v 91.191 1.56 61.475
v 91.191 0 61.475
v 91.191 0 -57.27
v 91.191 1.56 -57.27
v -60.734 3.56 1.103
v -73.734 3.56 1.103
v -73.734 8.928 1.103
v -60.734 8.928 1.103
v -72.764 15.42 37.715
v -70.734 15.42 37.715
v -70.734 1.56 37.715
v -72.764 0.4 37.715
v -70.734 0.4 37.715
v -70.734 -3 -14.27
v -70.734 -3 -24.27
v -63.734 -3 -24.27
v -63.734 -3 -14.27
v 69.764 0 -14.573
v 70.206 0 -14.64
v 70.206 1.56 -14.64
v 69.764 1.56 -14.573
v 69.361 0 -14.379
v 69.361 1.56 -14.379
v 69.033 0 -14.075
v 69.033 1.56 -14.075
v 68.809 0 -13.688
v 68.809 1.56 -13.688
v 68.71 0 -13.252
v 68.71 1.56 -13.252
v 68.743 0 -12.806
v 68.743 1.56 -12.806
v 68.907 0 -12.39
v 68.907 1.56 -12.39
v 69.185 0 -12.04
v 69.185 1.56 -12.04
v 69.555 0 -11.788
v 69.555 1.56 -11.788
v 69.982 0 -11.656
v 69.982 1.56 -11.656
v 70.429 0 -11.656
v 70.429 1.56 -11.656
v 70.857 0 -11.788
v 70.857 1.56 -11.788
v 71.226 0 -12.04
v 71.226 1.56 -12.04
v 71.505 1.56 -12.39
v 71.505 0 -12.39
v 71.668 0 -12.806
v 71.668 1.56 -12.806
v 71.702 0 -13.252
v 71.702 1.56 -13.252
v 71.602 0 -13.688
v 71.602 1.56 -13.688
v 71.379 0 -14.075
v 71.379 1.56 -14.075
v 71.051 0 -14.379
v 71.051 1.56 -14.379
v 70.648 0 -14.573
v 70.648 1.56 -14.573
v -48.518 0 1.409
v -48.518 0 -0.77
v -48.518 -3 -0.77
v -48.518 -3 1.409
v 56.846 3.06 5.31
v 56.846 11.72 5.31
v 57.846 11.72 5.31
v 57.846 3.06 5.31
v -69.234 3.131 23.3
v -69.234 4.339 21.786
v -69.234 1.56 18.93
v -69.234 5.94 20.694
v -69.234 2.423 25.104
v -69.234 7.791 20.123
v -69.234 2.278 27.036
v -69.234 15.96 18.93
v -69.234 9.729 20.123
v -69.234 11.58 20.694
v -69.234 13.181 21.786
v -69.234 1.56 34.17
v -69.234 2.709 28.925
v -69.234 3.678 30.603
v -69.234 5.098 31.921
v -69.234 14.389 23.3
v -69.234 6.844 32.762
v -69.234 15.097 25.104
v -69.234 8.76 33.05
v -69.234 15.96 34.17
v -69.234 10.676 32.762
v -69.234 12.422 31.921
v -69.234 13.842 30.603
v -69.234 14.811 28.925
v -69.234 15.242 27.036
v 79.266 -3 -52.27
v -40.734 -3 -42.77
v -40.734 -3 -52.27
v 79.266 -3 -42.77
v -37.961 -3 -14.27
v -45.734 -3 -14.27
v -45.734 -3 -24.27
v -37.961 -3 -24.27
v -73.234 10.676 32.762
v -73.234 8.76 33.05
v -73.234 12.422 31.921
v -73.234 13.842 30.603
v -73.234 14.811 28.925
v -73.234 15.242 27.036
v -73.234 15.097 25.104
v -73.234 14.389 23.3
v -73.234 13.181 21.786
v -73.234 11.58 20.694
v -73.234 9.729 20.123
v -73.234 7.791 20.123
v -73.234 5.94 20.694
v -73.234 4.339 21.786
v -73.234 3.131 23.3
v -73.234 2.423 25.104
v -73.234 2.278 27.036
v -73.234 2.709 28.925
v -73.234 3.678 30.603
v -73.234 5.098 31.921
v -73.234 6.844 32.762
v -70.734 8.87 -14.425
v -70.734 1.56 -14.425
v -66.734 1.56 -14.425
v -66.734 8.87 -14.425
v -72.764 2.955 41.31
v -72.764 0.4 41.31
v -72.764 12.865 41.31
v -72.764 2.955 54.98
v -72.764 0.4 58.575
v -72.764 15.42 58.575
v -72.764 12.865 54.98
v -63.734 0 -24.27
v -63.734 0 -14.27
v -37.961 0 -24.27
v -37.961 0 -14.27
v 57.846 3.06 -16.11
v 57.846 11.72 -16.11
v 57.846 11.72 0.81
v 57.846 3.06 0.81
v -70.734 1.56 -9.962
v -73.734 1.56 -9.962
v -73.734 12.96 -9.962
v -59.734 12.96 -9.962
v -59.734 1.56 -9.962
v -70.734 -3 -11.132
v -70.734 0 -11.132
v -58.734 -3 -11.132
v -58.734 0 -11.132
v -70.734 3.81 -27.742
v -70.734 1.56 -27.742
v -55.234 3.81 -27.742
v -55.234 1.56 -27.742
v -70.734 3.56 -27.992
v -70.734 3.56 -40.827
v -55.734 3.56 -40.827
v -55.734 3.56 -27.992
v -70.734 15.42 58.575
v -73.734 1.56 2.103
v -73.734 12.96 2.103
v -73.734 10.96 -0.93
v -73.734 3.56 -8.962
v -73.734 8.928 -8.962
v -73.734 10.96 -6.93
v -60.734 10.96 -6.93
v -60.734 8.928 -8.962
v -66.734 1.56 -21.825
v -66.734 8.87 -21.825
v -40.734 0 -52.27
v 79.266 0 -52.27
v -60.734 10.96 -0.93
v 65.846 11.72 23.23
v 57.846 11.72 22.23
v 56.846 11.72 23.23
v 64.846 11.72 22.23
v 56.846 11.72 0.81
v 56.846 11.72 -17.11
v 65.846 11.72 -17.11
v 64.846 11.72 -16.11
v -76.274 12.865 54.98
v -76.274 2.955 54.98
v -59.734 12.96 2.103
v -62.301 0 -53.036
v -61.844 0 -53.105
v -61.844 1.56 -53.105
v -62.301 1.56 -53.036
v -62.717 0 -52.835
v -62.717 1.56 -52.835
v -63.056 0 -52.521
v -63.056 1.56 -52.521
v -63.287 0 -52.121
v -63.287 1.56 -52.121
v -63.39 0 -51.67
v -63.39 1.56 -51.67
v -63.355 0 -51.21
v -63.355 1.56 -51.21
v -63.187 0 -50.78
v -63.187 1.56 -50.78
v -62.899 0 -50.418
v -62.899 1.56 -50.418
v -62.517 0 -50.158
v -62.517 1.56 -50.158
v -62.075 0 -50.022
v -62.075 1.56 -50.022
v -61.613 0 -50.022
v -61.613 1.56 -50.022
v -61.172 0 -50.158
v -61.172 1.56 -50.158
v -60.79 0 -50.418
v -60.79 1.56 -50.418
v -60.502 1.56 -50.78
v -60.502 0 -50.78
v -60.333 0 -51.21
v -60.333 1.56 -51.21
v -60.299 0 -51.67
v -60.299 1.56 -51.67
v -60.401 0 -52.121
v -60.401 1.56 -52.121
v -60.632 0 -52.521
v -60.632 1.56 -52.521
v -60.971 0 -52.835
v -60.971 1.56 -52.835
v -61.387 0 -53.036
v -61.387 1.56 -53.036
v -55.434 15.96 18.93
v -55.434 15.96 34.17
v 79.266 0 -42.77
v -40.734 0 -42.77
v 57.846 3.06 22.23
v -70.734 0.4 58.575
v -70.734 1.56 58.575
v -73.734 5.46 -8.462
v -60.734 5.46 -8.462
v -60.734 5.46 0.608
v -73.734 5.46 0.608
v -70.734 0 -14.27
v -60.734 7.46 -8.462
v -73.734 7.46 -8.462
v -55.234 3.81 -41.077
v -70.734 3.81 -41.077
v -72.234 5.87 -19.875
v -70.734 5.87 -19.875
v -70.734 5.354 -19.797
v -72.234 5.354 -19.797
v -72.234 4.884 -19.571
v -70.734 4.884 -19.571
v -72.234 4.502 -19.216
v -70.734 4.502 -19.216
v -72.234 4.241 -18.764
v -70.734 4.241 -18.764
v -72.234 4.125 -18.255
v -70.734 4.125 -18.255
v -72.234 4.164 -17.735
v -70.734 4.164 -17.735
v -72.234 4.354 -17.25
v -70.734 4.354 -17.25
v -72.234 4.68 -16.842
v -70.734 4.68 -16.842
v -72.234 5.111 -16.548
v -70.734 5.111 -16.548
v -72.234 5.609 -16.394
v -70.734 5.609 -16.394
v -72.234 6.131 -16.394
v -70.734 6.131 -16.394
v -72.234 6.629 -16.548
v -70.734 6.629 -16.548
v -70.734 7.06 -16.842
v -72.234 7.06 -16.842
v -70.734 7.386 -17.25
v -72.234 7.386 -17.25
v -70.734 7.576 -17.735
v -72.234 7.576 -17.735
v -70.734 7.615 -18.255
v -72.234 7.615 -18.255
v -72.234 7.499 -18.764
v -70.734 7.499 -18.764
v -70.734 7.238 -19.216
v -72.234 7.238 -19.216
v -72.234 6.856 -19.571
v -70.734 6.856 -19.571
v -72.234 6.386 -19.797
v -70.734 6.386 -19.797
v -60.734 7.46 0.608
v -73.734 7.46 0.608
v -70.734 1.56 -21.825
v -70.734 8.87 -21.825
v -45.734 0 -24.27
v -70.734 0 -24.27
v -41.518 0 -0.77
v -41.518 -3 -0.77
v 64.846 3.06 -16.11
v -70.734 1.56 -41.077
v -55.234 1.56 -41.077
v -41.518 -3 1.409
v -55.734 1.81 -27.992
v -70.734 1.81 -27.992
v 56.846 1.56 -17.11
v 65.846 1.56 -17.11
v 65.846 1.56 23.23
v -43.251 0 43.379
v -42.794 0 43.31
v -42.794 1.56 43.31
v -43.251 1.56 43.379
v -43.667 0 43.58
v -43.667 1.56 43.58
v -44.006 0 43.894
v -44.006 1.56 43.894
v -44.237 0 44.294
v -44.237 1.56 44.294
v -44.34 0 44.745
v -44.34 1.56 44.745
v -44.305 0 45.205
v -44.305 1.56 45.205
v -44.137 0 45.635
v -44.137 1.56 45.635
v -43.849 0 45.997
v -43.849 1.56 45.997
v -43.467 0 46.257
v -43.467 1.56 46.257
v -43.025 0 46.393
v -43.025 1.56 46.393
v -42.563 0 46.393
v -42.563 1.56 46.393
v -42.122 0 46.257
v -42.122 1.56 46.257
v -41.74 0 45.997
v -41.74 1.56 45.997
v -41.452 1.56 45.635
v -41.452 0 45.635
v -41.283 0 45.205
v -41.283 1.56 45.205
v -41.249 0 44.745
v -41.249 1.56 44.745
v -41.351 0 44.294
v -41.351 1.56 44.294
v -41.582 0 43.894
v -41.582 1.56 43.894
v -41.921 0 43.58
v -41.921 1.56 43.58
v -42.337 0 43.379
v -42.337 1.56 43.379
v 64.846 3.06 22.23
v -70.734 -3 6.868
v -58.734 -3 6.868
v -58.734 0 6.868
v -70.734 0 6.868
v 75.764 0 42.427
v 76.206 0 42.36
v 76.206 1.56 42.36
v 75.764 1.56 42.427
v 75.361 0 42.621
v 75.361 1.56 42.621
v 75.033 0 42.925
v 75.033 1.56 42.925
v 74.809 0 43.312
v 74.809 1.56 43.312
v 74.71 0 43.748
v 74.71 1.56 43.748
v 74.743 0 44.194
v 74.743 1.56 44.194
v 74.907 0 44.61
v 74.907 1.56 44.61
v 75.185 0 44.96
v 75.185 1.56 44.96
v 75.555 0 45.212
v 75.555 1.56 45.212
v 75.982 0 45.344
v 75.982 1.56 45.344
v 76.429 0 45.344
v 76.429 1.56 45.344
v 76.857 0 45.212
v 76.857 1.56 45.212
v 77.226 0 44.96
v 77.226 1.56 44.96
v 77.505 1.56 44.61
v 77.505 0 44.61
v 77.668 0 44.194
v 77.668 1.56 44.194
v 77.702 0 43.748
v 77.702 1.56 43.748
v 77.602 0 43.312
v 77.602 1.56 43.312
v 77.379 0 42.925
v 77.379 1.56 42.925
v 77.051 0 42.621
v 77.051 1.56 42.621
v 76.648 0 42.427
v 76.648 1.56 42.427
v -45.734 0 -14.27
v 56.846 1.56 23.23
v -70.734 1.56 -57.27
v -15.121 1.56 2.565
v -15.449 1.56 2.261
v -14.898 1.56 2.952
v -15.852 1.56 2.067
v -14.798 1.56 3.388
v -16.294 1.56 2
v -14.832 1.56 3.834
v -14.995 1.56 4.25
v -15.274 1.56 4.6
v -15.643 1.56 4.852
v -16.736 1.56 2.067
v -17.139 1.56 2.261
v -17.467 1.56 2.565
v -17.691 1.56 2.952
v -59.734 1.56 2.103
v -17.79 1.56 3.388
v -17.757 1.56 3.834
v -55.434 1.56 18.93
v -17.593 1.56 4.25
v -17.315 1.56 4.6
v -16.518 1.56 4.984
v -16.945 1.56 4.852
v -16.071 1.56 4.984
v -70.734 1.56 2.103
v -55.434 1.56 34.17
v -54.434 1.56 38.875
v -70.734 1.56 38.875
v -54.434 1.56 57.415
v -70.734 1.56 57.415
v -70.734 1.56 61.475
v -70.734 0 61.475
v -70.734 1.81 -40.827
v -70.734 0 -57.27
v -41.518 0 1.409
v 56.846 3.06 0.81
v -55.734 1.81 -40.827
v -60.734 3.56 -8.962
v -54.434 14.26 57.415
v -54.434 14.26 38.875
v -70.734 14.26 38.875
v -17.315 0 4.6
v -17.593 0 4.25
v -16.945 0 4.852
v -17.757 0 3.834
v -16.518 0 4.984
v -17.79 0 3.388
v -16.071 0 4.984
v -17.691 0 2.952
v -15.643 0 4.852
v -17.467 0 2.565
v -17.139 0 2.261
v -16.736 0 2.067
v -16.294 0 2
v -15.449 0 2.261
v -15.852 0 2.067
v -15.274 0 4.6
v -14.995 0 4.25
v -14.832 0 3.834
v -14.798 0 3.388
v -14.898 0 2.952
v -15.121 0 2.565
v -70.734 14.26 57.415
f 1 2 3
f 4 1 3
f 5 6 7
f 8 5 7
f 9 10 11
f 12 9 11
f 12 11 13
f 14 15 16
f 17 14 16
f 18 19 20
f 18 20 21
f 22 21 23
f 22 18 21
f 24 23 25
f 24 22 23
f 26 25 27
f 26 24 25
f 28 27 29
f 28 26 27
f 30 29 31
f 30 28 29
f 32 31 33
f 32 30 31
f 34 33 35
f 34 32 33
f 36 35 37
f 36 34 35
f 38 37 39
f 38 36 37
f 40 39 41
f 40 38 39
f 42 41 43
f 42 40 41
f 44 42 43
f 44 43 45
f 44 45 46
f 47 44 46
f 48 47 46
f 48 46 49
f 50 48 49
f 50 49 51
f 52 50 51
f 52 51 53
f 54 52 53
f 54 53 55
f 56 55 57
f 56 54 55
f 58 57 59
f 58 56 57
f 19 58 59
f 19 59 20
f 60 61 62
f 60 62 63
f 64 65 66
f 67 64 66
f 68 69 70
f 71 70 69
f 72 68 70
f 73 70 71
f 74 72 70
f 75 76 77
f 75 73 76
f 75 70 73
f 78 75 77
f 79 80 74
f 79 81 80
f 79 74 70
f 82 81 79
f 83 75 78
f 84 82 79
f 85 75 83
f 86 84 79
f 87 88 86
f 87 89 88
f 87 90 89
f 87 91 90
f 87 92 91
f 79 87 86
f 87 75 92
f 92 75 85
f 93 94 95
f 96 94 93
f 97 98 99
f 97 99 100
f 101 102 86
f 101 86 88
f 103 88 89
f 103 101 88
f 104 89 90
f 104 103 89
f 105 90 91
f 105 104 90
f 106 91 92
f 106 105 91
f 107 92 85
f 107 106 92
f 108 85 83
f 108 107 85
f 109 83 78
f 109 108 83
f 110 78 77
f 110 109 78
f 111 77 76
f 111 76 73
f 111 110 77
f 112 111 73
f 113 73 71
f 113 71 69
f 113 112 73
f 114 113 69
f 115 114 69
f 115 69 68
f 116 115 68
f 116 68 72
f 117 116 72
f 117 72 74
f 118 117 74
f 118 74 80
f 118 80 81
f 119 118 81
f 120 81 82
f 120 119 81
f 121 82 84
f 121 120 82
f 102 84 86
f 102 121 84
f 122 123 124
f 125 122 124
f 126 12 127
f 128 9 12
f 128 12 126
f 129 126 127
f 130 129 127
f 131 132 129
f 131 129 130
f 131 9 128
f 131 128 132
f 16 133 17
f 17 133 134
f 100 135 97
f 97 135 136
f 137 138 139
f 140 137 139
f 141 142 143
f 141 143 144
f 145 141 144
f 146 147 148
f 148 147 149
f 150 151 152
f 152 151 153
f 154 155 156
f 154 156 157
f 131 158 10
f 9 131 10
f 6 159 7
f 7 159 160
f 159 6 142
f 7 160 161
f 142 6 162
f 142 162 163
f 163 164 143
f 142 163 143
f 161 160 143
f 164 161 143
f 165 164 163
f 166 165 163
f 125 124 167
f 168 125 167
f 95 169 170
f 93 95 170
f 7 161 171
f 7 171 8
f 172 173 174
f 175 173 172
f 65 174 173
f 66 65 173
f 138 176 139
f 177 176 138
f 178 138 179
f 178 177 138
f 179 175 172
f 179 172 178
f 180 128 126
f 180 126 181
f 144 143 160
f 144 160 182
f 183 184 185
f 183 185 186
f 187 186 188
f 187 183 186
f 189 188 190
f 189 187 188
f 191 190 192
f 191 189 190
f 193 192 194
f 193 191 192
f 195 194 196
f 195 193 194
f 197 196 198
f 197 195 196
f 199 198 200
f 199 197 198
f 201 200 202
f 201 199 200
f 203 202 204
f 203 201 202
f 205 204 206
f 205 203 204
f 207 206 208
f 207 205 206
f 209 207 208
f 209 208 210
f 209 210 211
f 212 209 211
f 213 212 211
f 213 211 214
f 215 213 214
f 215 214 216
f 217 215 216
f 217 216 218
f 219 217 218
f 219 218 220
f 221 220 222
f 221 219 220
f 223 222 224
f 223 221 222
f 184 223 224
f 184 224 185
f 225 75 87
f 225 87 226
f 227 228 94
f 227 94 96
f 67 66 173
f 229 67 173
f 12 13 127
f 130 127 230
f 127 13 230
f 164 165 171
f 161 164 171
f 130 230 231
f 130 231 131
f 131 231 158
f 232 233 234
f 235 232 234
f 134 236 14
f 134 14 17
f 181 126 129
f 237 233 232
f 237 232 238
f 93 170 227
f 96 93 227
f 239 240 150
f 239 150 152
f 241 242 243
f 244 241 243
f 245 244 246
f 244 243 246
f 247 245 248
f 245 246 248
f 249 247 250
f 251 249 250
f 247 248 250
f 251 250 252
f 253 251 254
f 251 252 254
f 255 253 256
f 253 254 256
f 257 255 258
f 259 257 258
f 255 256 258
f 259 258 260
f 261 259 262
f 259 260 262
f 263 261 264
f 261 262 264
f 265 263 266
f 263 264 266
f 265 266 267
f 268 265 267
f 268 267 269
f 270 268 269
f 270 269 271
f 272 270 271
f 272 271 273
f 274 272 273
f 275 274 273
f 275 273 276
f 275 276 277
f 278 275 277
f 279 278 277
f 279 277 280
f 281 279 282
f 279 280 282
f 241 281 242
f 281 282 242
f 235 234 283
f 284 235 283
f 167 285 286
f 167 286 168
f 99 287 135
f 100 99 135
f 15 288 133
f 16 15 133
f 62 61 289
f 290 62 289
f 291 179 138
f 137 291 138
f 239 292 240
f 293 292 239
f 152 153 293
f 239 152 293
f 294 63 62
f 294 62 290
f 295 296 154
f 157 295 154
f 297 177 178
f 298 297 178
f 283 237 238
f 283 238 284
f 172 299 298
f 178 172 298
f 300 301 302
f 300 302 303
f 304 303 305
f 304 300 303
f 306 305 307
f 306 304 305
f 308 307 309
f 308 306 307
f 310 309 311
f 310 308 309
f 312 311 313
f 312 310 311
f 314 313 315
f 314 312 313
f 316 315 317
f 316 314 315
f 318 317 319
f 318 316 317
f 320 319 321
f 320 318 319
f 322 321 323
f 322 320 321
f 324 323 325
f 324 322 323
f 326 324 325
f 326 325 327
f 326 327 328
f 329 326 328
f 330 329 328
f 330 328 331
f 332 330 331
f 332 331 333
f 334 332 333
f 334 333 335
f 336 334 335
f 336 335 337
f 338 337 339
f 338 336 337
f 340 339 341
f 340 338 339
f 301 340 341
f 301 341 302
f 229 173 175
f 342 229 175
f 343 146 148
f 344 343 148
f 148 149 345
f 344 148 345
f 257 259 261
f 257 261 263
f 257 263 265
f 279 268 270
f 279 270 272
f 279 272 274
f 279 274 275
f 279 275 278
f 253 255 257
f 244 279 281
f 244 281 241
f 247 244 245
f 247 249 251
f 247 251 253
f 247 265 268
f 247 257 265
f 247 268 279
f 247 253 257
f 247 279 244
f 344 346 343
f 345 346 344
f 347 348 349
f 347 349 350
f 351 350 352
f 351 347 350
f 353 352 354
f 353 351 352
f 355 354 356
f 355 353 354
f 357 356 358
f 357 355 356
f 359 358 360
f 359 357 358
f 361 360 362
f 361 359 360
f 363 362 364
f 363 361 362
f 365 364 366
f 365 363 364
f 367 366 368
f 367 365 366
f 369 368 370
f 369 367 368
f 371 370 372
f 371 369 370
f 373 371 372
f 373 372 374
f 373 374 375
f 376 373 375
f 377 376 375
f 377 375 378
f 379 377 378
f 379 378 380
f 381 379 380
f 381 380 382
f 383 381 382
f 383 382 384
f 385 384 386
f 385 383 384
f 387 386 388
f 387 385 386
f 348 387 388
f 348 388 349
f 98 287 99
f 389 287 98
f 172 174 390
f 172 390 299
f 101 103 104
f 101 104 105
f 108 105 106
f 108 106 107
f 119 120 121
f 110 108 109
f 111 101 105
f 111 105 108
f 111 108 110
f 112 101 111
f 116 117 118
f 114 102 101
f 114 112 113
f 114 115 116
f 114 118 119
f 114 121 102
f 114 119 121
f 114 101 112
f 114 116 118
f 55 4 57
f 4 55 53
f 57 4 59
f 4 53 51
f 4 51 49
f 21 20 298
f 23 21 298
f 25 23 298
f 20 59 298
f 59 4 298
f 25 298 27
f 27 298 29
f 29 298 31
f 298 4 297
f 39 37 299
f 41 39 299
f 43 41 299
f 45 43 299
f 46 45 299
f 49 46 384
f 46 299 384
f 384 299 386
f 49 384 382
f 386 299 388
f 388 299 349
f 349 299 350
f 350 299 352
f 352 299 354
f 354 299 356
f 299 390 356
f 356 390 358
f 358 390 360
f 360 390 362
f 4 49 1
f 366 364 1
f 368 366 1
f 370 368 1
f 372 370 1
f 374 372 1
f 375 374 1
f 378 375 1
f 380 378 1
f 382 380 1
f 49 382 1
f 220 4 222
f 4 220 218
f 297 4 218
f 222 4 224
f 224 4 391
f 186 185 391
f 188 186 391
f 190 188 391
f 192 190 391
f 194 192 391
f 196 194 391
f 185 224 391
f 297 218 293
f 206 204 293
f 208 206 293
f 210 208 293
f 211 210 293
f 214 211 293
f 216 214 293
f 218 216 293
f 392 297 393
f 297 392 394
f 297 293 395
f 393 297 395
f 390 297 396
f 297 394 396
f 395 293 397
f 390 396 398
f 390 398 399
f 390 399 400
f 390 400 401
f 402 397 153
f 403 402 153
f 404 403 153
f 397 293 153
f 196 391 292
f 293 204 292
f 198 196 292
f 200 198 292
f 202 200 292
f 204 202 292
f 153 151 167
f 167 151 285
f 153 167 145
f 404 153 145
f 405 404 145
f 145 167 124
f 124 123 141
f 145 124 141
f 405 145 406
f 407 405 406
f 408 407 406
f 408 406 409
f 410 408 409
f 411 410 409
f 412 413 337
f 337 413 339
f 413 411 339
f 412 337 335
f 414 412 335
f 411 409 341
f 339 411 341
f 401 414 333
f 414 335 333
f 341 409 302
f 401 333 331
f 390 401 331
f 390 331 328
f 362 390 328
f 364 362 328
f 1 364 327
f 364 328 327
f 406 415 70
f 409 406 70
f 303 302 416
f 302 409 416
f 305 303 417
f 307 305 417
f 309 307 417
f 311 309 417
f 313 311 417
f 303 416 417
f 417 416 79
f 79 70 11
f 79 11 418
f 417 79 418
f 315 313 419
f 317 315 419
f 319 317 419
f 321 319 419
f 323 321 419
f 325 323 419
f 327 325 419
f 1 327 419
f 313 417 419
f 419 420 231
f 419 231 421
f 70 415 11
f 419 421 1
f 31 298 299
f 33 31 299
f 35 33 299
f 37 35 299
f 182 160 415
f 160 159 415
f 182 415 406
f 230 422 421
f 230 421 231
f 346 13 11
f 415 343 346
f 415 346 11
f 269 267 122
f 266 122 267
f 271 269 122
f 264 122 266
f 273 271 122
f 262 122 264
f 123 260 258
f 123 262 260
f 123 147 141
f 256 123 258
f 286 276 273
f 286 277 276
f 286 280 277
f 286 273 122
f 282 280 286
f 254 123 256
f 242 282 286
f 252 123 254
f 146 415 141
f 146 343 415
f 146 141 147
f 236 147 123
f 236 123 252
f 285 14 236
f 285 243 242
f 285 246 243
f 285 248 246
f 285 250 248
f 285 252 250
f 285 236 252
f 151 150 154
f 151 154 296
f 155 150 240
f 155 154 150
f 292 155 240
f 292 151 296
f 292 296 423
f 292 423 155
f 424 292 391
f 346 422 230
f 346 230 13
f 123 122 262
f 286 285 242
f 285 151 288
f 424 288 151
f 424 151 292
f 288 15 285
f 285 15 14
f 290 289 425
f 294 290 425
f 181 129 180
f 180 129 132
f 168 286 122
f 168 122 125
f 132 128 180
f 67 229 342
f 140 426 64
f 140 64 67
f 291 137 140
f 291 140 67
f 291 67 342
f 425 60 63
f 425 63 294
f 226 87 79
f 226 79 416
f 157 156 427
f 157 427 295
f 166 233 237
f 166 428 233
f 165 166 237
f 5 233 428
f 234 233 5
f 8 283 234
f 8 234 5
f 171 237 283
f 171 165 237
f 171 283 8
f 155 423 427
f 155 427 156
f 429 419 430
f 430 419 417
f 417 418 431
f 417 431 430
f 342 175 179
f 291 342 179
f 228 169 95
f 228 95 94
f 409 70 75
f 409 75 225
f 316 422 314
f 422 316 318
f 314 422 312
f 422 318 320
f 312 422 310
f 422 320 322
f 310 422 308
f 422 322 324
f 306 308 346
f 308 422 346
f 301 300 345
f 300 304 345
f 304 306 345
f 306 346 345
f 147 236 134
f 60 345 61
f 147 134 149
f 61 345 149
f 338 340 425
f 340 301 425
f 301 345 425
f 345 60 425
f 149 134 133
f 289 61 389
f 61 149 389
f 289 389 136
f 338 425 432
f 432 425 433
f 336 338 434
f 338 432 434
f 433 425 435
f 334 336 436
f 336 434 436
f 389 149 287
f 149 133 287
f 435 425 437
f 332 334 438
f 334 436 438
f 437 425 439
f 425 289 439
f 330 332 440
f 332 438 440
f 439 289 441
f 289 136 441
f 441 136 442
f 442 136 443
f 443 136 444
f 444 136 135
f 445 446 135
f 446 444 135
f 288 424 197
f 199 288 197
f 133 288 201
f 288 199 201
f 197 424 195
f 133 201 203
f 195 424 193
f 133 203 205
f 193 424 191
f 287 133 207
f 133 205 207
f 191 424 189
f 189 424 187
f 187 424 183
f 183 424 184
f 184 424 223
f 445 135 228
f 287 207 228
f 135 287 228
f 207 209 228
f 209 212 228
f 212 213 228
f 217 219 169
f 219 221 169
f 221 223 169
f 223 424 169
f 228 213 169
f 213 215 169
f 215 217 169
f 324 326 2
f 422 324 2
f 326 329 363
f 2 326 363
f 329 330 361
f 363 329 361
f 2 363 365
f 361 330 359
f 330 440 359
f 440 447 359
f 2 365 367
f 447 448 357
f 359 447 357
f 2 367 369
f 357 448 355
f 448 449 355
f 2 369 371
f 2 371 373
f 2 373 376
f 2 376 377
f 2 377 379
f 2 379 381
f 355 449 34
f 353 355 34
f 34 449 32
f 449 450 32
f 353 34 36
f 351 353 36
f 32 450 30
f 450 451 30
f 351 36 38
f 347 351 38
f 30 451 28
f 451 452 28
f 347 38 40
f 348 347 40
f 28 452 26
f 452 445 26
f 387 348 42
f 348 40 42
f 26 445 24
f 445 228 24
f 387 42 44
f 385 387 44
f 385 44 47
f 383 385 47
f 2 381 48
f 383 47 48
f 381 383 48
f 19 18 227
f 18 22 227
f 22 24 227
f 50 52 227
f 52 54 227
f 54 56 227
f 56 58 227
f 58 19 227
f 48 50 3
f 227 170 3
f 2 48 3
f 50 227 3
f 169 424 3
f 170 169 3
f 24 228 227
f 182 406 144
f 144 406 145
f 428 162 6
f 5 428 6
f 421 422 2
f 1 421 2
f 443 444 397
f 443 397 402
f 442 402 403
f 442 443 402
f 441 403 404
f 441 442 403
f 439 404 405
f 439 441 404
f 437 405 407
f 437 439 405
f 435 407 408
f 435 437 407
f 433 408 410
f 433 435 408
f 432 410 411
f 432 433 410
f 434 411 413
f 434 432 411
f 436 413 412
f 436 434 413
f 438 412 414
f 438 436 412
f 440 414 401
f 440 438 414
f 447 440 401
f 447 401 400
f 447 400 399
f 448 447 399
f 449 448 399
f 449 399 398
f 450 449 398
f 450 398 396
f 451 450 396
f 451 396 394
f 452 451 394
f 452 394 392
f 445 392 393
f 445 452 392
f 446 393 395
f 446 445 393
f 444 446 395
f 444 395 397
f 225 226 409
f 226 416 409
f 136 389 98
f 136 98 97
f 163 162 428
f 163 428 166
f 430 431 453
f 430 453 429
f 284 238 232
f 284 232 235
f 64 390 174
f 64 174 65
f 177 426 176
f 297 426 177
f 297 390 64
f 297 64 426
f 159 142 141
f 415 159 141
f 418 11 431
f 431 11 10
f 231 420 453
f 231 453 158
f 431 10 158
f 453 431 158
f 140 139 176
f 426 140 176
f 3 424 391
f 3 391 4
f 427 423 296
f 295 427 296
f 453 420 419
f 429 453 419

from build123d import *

# Parameters (mm, degrees)
SKETCH1_W            = 161.925
SKETCH1_H            = 118.745
SKETCH1_R            = 1.55
SKETCH1_R_2          = 1.5
BOSS_EXTRUDE1_DEPTH  = 1.56
SKETCH2_W            = 20
SKETCH2_H            = 10.4775
SKETCH2_W_2          = 15.3
SKETCH2_H_2          = 7.62
SKETCH2_W_3          = 11
SKETCH2_H_3          = 6.0325
SKETCH2_W_4          = 15.5
SKETCH2_H_4          = 6.6675
BOSS_EXTRUDE2_DEPTH  = 5
SKETCH4_W            = 17.8
SKETCH4_H            = 15.24
BOSS_EXTRUDE3_DEPTH  = 9.4
SKETCH5_W            = 15.24
SKETCH5_H            = 14.4
SKETCH5_R            = 6.5
CUT_EXTRUDE1_DEPTH   = 4
SKETCH7_W            = 15.5
SKETCH7_H            = 13.335
CUT_EXTRUDE3_DEPTH   = 2.75
SKETCH8_W            = 12.835
SKETCH8_H            = 1.75
CUT_EXTRUDE4_DEPTH   = 15
SKETCH9_W            = 14
SKETCH9_H            = 12.065
BOSS_EXTRUDE4_DEPTH  = 6.4
SKETCH10_W           = 10.065
SKETCH10_H           = 7.4
CUT_EXTRUDE5_DEPTH   = 13
SKETCH11_W           = 9.07
SKETCH11_H           = 2
BOSS_EXTRUDE5_DEPTH  = 13
BOSS_EXTRUDE6_DEPTH  = 5
BOSS_EXTRUDE8_DEPTH  = 4
SKETCH38_W           = 31.093633867
SKETCH38_H           = 25.604360888
CUT_EXTRUDE14_DEPTH  = 10
SKETCH39_W           = 16.3
SKETCH39_H           = 18.54
BOSS_EXTRUDE9_DEPTH  = 12.7
SKETCH40_W           = 1.16
SKETCH40_H           = 1.16
SKETCH40_H_2         = 12.7
BOSS_EXTRUDE10_DEPTH = 2.03
SKETCH41_W           = 13.67
SKETCH41_H           = 9.91
BOSS_EXTRUDE11_DEPTH = 3.51
CUT_EXTRUDE15_DEPTH  = 111.727077745
SKETCH43_W           = 9
SKETCH43_H           = 40.34
BOSS_EXTRUDE12_DEPTH = 10.16
CUT_EXTRUDE16_DEPTH  = 8.66
SKETCH46_W           = 120
SKETCH46_H           = 9.5
SKETCH46_W_2         = 7
SKETCH46_H_2         = 10
SKETCH46_W_3         = 7.773635701
SKETCH46_W_4         = 12
SKETCH46_H_3         = 18
SKETCH46_H_4         = 2.178592617
BOSS_EXTRUDE14_DEPTH = 3
BOSS_EXTRUDE15_DEPTH = 13
SKETCH49_W           = 4
SKETCH49_H           = 7.4
BOSS_EXTRUDE16_DEPTH = 7.31
SKETCH50_R           = 1.75
BOSS_EXTRUDE17_DEPTH = 1.5


with BuildPart() as part:
    # Sketch1 → Boss-Extrude1 (new body)
    with BuildSketch(Plane(origin=(0, 0, 0), x_dir=(1, 0, 0), z_dir=(0, 1, 0))):
        with Locations((10.228253106, -2.102894012)):
            Rectangle(SKETCH1_W, SKETCH1_H)
        with Locations(Location((-42.794246894, -44.860394012, 0), (0, 0, 90))):
            Circle(SKETCH1_R, mode=Mode.SUBTRACT)
        with Locations(Location((-61.844246894, 51.554605988, 0), (0, 0, 90))):
            Circle(SKETCH1_R, mode=Mode.SUBTRACT)
        with Locations(Location((70.205753106, 13.139605988, 0), (0, 0, 90))):
            Circle(SKETCH1_R_2, mode=Mode.SUBTRACT)
        with Locations(Location((-16.294246894, -3.500394012, 0), (0, 0, 90))):
            Circle(SKETCH1_R_2, mode=Mode.SUBTRACT)
        with Locations(Location((76.205753106, -43.860394012, 0), (0, 0, 90))):
            Circle(SKETCH1_R_2, mode=Mode.SUBTRACT)
    extrude(amount=BOSS_EXTRUDE1_DEPTH)

    # Sketch2 → Boss-Extrude2 (add)
    with BuildSketch(Plane(origin=(0, 1.56, 0), x_dir=(1, 0, 0), z_dir=(0, 1, 0))):
        with Locations((-60.734246894, -42.901644012)):
            Rectangle(SKETCH2_W, SKETCH2_H)
        with Locations((-60.734246894, -53.379144012)):
            Rectangle(SKETCH2_W, SKETCH2_H)
        with Locations((-63.084246894, -30.360394012)):
            Rectangle(SKETCH2_W_2, SKETCH2_H_2)
        with Locations((-63.084246894, -22.740394012)):
            Rectangle(SKETCH2_W_2, SKETCH2_H_2)
        Polygon((-70.734246894, -34.170394012), (-70.734246894, -26.550394012), (-70.734246894, -18.930394012), (-73.234246894, -18.930394012), (-73.234246894, -34.170394012), align=None)
        with Locations((-65.234246894, 6.945855988)):
            Rectangle(SKETCH2_W_3, SKETCH2_H_3)
        Polygon((-70.734246894, -2.102894012), (-70.734246894, 3.929605988), (-70.734246894, 9.962105988), (-73.734246894, 9.962105988), (-73.734246894, -2.102894012), align=None)
        with Locations((-65.234246894, 0.913355988)):
            Rectangle(SKETCH2_W_3, SKETCH2_H_3)
        with Locations((-62.984246894, 37.743355988)):
            Rectangle(SKETCH2_W_4, SKETCH2_H_4)
        with Locations((-62.984246894, 31.075855988)):
            Rectangle(SKETCH2_W_4, SKETCH2_H_4)
    extrude(amount=BOSS_EXTRUDE2_DEPTH)

    # Sketch4 → Boss-Extrude3 (add)
    with BuildSketch(Plane(origin=(0, 6.56, 0), x_dir=(1, 0, 0), z_dir=(0, 1, 0))):
        with Locations((-64.334246894, -26.550394012)):
            Rectangle(SKETCH4_W, SKETCH4_H)
    extrude(amount=BOSS_EXTRUDE3_DEPTH)

    # Sketch5 → Cut-Extrude1 (cut)
    with BuildSketch(Plane.ZY.offset(73.234246894)):
        with Locations((26.550394012, 8.76)):
            Rectangle(SKETCH5_W, SKETCH5_H)
        with Locations((26.550394012, 8.76)):
            Circle(SKETCH5_R, mode=Mode.SUBTRACT)
    extrude(amount=-CUT_EXTRUDE1_DEPTH, mode=Mode.SUBTRACT)

    # Sketch7 → Cut-Extrude3 (cut)
    with BuildSketch(Plane(origin=(0, 6.56, 0), x_dir=(1, 0, 0), z_dir=(0, 1, 0))):
        with Locations((-62.984246894, 34.409605988)):
            Rectangle(SKETCH7_W, SKETCH7_H)
    extrude(amount=-CUT_EXTRUDE3_DEPTH, mode=Mode.SUBTRACT)

    # Sketch8 → Cut-Extrude4 (cut)
    with BuildSketch(Plane.ZY.offset(70.734246894)):
        with Locations((-34.409605988, 2.685)):
            Rectangle(SKETCH8_W, SKETCH8_H)
    extrude(amount=-CUT_EXTRUDE4_DEPTH, mode=Mode.SUBTRACT)

    # Sketch9 → Boss-Extrude4 (add)
    with BuildSketch(Plane(origin=(0, 6.56, 0), x_dir=(1, 0, 0), z_dir=(0, 1, 0))):
        with Locations((-66.734246894, 3.929605988)):
            Rectangle(SKETCH9_W, SKETCH9_H)
    extrude(amount=BOSS_EXTRUDE4_DEPTH)

    # Sketch10 → Cut-Extrude5 (cut)
    with BuildSketch(Plane.ZY.offset(73.734246894)):
        with Locations((-3.929605988, 7.26)):
            Rectangle(SKETCH10_W, SKETCH10_H)
    extrude(amount=-CUT_EXTRUDE5_DEPTH, mode=Mode.SUBTRACT)

    # Sketch11 → Boss-Extrude5 (add)
    with BuildSketch(Plane.ZY.offset(60.734246894)):
        with Locations((-3.927105988, 6.46)):
            Rectangle(SKETCH11_W, SKETCH11_H)
    extrude(amount=BOSS_EXTRUDE5_DEPTH)

    # Sketch12 → Boss-Extrude6 (add)
    with BuildSketch(Plane(origin=(0, 6.56, 0), x_dir=(1, 0, 0), z_dir=(0, 1, 0))):
        Polygon((-70.734246894, -58.617894012), (-71.734246894, -58.617894012), (-71.734246894, -60.117894012), (-73.734246894, -60.117894012), (-73.806970959, -36.162894012), (-71.734246894, -36.162894012), (-71.734246894, -37.662894012), (-70.734246894, -37.662894012), align=None)
    extrude(amount=-BOSS_EXTRUDE6_DEPTH)

    # Sketch13 → Boss-Extrude8 (add)
    with BuildSketch(Plane(origin=(0, 6.56, 0), x_dir=(1, 0, 0), z_dir=(0, 1, 0))):
        Polygon((-50.734246894, -37.662894012), (-50.734246894, -58.617894012), (-71.734246894, -58.617894012), (-71.734246894, -60.117894012), (-73.734246894, -60.117894012), (-73.806970959, -36.162894012), (-71.734246894, -36.162894012), (-71.734246894, -37.662894012), align=None)
    extrude(amount=BOSS_EXTRUDE8_DEPTH)

    # Sketch38 → Cut-Extrude14 (cut)
    with BuildSketch(Plane(origin=(0, 1.56, 0), x_dir=(1, 0, 0), z_dir=(0, 1, 0))):
        with Locations((-64.389815501, -47.792725567)):
            Rectangle(SKETCH38_W, SKETCH38_H)
    extrude(amount=CUT_EXTRUDE14_DEPTH, mode=Mode.SUBTRACT)

    # Sketch39 → Boss-Extrude9 (add)
    with BuildSketch(Plane(origin=(0, 1.56, 0), x_dir=(1, 0, 0), z_dir=(0, 1, 0))):
        with Locations((-62.584246894, -48.145394012)):
            Rectangle(SKETCH39_W, SKETCH39_H)
    extrude(amount=BOSS_EXTRUDE9_DEPTH)

    # Sketch40 → Boss-Extrude10 (add)
    with BuildSketch(Plane.ZY.offset(70.734246894)):
        with Locations((38.295394012, 14.84)):
            Rectangle(SKETCH40_W, SKETCH40_H)
        Polygon((38.875394012, 15.42), (38.875394012, 14.26), (57.415394012, 14.26), (57.415394012, 1.56), (58.575394012, 1.56), (58.575394012, 15.42), align=None)
        with Locations((38.295394012, 7.91)):
            Rectangle(SKETCH40_W, SKETCH40_H_2)
        Polygon((57.415394012, 14.26), (38.875394012, 14.26), (38.875394012, 1.56), (37.715394012, 1.56), (37.715394012, 0.4), (57.415394012, 0.4), (57.415394012, 1.56), align=None)
        with Locations((57.995394012, 0.98)):
            Rectangle(SKETCH40_W, SKETCH40_H)
    extrude(amount=BOSS_EXTRUDE10_DEPTH)

    # Sketch41 → Boss-Extrude11 (add)
    with BuildSketch(Plane.ZY.offset(72.764246894)):
        with Locations((48.145394012, 7.91)):
            Rectangle(SKETCH41_W, SKETCH41_H)
    extrude(amount=BOSS_EXTRUDE11_DEPTH)

    # Sketch42 → Cut-Extrude15 (cut, through all)
    with BuildSketch(Plane(origin=(0, 12.865, 0), x_dir=(1, 0, 0), z_dir=(0, 1, 0))):
        Polygon((-72.764246894, -41.310394012), (-76.274246894, -54.980394012), (-76.274246894, -41.310394012), align=None)
    extrude(amount=-CUT_EXTRUDE15_DEPTH, mode=Mode.SUBTRACT)

    # Sketch43 → Boss-Extrude12 (add)
    with BuildSketch(Plane(origin=(0, 1.56, 0), x_dir=(1, 0, 0), z_dir=(0, 1, 0))):
        with Locations((61.345753106, -3.060394012)):
            Rectangle(SKETCH43_W, SKETCH43_H)
    extrude(amount=BOSS_EXTRUDE12_DEPTH)

    # Sketch44 → Cut-Extrude16 (cut)
    with BuildSketch(Plane(origin=(0, 11.72, 0), x_dir=(1, 0, 0), z_dir=(0, 1, 0))):
        Polygon((57.845753106, -0.810394012), (56.845753106, -0.810394012), (56.845753106, -5.310394012), (57.845753106, -5.310394012), (57.845753106, -22.230394012), (64.845753106, -22.230394012), (64.845753106, 16.109605988), (57.845753106, 16.109605988), align=None)
    extrude(amount=-CUT_EXTRUDE16_DEPTH, mode=Mode.SUBTRACT)

    # Sketch46 → Boss-Extrude14 (add)
    with BuildSketch(Plane.XZ):
        with Locations((19.265753106, -47.519605988)):
            Rectangle(SKETCH46_W, SKETCH46_H)
        with Locations((-67.234246894, -19.269605988)):
            Rectangle(SKETCH46_W_2, SKETCH46_H_2)
        with Locations((-41.847429044, -19.269605988)):
            Rectangle(SKETCH46_W_3, SKETCH46_H_2)
        with Locations((-64.734246894, -2.132030476)):
            Rectangle(SKETCH46_W_4, SKETCH46_H_3)
        with Locations((-45.018245774, 0.319690321)):
            Rectangle(SKETCH46_W_2, SKETCH46_H_4)
    extrude(amount=BOSS_EXTRUDE14_DEPTH)

    # Sketch47 → Boss-Extrude15 (add)
    with BuildSketch(Plane.ZY.offset(73.734246894)):
        Polygon((-6.929605988, 10.96), (-8.962105988, 8.9275), (-8.962105988, 10.96), align=None)
        Polygon((-0.929605988, 10.96), (1.102894012, 8.9275), (1.102894012, 10.96), align=None)
    extrude(amount=-BOSS_EXTRUDE15_DEPTH)

    # Sketch49 → Boss-Extrude16 (add)
    with BuildSketch(Plane(origin=(0, 1.56, 0), x_dir=(1, 0, 0), z_dir=(0, 1, 0))):
        with Locations((-68.734246894, 18.124605988)):
            Rectangle(SKETCH49_W, SKETCH49_H)
    extrude(amount=BOSS_EXTRUDE16_DEPTH)

    # Sketch50 → Boss-Extrude17 (add)
    with BuildSketch(Plane.ZY.offset(70.734246894)):
        with Locations(Location((-18.124605988, 5.87, 0), (0, 0, 180))):
            Circle(SKETCH50_R)
    extrude(amount=BOSS_EXTRUDE17_DEPTH)


solid = part.part
